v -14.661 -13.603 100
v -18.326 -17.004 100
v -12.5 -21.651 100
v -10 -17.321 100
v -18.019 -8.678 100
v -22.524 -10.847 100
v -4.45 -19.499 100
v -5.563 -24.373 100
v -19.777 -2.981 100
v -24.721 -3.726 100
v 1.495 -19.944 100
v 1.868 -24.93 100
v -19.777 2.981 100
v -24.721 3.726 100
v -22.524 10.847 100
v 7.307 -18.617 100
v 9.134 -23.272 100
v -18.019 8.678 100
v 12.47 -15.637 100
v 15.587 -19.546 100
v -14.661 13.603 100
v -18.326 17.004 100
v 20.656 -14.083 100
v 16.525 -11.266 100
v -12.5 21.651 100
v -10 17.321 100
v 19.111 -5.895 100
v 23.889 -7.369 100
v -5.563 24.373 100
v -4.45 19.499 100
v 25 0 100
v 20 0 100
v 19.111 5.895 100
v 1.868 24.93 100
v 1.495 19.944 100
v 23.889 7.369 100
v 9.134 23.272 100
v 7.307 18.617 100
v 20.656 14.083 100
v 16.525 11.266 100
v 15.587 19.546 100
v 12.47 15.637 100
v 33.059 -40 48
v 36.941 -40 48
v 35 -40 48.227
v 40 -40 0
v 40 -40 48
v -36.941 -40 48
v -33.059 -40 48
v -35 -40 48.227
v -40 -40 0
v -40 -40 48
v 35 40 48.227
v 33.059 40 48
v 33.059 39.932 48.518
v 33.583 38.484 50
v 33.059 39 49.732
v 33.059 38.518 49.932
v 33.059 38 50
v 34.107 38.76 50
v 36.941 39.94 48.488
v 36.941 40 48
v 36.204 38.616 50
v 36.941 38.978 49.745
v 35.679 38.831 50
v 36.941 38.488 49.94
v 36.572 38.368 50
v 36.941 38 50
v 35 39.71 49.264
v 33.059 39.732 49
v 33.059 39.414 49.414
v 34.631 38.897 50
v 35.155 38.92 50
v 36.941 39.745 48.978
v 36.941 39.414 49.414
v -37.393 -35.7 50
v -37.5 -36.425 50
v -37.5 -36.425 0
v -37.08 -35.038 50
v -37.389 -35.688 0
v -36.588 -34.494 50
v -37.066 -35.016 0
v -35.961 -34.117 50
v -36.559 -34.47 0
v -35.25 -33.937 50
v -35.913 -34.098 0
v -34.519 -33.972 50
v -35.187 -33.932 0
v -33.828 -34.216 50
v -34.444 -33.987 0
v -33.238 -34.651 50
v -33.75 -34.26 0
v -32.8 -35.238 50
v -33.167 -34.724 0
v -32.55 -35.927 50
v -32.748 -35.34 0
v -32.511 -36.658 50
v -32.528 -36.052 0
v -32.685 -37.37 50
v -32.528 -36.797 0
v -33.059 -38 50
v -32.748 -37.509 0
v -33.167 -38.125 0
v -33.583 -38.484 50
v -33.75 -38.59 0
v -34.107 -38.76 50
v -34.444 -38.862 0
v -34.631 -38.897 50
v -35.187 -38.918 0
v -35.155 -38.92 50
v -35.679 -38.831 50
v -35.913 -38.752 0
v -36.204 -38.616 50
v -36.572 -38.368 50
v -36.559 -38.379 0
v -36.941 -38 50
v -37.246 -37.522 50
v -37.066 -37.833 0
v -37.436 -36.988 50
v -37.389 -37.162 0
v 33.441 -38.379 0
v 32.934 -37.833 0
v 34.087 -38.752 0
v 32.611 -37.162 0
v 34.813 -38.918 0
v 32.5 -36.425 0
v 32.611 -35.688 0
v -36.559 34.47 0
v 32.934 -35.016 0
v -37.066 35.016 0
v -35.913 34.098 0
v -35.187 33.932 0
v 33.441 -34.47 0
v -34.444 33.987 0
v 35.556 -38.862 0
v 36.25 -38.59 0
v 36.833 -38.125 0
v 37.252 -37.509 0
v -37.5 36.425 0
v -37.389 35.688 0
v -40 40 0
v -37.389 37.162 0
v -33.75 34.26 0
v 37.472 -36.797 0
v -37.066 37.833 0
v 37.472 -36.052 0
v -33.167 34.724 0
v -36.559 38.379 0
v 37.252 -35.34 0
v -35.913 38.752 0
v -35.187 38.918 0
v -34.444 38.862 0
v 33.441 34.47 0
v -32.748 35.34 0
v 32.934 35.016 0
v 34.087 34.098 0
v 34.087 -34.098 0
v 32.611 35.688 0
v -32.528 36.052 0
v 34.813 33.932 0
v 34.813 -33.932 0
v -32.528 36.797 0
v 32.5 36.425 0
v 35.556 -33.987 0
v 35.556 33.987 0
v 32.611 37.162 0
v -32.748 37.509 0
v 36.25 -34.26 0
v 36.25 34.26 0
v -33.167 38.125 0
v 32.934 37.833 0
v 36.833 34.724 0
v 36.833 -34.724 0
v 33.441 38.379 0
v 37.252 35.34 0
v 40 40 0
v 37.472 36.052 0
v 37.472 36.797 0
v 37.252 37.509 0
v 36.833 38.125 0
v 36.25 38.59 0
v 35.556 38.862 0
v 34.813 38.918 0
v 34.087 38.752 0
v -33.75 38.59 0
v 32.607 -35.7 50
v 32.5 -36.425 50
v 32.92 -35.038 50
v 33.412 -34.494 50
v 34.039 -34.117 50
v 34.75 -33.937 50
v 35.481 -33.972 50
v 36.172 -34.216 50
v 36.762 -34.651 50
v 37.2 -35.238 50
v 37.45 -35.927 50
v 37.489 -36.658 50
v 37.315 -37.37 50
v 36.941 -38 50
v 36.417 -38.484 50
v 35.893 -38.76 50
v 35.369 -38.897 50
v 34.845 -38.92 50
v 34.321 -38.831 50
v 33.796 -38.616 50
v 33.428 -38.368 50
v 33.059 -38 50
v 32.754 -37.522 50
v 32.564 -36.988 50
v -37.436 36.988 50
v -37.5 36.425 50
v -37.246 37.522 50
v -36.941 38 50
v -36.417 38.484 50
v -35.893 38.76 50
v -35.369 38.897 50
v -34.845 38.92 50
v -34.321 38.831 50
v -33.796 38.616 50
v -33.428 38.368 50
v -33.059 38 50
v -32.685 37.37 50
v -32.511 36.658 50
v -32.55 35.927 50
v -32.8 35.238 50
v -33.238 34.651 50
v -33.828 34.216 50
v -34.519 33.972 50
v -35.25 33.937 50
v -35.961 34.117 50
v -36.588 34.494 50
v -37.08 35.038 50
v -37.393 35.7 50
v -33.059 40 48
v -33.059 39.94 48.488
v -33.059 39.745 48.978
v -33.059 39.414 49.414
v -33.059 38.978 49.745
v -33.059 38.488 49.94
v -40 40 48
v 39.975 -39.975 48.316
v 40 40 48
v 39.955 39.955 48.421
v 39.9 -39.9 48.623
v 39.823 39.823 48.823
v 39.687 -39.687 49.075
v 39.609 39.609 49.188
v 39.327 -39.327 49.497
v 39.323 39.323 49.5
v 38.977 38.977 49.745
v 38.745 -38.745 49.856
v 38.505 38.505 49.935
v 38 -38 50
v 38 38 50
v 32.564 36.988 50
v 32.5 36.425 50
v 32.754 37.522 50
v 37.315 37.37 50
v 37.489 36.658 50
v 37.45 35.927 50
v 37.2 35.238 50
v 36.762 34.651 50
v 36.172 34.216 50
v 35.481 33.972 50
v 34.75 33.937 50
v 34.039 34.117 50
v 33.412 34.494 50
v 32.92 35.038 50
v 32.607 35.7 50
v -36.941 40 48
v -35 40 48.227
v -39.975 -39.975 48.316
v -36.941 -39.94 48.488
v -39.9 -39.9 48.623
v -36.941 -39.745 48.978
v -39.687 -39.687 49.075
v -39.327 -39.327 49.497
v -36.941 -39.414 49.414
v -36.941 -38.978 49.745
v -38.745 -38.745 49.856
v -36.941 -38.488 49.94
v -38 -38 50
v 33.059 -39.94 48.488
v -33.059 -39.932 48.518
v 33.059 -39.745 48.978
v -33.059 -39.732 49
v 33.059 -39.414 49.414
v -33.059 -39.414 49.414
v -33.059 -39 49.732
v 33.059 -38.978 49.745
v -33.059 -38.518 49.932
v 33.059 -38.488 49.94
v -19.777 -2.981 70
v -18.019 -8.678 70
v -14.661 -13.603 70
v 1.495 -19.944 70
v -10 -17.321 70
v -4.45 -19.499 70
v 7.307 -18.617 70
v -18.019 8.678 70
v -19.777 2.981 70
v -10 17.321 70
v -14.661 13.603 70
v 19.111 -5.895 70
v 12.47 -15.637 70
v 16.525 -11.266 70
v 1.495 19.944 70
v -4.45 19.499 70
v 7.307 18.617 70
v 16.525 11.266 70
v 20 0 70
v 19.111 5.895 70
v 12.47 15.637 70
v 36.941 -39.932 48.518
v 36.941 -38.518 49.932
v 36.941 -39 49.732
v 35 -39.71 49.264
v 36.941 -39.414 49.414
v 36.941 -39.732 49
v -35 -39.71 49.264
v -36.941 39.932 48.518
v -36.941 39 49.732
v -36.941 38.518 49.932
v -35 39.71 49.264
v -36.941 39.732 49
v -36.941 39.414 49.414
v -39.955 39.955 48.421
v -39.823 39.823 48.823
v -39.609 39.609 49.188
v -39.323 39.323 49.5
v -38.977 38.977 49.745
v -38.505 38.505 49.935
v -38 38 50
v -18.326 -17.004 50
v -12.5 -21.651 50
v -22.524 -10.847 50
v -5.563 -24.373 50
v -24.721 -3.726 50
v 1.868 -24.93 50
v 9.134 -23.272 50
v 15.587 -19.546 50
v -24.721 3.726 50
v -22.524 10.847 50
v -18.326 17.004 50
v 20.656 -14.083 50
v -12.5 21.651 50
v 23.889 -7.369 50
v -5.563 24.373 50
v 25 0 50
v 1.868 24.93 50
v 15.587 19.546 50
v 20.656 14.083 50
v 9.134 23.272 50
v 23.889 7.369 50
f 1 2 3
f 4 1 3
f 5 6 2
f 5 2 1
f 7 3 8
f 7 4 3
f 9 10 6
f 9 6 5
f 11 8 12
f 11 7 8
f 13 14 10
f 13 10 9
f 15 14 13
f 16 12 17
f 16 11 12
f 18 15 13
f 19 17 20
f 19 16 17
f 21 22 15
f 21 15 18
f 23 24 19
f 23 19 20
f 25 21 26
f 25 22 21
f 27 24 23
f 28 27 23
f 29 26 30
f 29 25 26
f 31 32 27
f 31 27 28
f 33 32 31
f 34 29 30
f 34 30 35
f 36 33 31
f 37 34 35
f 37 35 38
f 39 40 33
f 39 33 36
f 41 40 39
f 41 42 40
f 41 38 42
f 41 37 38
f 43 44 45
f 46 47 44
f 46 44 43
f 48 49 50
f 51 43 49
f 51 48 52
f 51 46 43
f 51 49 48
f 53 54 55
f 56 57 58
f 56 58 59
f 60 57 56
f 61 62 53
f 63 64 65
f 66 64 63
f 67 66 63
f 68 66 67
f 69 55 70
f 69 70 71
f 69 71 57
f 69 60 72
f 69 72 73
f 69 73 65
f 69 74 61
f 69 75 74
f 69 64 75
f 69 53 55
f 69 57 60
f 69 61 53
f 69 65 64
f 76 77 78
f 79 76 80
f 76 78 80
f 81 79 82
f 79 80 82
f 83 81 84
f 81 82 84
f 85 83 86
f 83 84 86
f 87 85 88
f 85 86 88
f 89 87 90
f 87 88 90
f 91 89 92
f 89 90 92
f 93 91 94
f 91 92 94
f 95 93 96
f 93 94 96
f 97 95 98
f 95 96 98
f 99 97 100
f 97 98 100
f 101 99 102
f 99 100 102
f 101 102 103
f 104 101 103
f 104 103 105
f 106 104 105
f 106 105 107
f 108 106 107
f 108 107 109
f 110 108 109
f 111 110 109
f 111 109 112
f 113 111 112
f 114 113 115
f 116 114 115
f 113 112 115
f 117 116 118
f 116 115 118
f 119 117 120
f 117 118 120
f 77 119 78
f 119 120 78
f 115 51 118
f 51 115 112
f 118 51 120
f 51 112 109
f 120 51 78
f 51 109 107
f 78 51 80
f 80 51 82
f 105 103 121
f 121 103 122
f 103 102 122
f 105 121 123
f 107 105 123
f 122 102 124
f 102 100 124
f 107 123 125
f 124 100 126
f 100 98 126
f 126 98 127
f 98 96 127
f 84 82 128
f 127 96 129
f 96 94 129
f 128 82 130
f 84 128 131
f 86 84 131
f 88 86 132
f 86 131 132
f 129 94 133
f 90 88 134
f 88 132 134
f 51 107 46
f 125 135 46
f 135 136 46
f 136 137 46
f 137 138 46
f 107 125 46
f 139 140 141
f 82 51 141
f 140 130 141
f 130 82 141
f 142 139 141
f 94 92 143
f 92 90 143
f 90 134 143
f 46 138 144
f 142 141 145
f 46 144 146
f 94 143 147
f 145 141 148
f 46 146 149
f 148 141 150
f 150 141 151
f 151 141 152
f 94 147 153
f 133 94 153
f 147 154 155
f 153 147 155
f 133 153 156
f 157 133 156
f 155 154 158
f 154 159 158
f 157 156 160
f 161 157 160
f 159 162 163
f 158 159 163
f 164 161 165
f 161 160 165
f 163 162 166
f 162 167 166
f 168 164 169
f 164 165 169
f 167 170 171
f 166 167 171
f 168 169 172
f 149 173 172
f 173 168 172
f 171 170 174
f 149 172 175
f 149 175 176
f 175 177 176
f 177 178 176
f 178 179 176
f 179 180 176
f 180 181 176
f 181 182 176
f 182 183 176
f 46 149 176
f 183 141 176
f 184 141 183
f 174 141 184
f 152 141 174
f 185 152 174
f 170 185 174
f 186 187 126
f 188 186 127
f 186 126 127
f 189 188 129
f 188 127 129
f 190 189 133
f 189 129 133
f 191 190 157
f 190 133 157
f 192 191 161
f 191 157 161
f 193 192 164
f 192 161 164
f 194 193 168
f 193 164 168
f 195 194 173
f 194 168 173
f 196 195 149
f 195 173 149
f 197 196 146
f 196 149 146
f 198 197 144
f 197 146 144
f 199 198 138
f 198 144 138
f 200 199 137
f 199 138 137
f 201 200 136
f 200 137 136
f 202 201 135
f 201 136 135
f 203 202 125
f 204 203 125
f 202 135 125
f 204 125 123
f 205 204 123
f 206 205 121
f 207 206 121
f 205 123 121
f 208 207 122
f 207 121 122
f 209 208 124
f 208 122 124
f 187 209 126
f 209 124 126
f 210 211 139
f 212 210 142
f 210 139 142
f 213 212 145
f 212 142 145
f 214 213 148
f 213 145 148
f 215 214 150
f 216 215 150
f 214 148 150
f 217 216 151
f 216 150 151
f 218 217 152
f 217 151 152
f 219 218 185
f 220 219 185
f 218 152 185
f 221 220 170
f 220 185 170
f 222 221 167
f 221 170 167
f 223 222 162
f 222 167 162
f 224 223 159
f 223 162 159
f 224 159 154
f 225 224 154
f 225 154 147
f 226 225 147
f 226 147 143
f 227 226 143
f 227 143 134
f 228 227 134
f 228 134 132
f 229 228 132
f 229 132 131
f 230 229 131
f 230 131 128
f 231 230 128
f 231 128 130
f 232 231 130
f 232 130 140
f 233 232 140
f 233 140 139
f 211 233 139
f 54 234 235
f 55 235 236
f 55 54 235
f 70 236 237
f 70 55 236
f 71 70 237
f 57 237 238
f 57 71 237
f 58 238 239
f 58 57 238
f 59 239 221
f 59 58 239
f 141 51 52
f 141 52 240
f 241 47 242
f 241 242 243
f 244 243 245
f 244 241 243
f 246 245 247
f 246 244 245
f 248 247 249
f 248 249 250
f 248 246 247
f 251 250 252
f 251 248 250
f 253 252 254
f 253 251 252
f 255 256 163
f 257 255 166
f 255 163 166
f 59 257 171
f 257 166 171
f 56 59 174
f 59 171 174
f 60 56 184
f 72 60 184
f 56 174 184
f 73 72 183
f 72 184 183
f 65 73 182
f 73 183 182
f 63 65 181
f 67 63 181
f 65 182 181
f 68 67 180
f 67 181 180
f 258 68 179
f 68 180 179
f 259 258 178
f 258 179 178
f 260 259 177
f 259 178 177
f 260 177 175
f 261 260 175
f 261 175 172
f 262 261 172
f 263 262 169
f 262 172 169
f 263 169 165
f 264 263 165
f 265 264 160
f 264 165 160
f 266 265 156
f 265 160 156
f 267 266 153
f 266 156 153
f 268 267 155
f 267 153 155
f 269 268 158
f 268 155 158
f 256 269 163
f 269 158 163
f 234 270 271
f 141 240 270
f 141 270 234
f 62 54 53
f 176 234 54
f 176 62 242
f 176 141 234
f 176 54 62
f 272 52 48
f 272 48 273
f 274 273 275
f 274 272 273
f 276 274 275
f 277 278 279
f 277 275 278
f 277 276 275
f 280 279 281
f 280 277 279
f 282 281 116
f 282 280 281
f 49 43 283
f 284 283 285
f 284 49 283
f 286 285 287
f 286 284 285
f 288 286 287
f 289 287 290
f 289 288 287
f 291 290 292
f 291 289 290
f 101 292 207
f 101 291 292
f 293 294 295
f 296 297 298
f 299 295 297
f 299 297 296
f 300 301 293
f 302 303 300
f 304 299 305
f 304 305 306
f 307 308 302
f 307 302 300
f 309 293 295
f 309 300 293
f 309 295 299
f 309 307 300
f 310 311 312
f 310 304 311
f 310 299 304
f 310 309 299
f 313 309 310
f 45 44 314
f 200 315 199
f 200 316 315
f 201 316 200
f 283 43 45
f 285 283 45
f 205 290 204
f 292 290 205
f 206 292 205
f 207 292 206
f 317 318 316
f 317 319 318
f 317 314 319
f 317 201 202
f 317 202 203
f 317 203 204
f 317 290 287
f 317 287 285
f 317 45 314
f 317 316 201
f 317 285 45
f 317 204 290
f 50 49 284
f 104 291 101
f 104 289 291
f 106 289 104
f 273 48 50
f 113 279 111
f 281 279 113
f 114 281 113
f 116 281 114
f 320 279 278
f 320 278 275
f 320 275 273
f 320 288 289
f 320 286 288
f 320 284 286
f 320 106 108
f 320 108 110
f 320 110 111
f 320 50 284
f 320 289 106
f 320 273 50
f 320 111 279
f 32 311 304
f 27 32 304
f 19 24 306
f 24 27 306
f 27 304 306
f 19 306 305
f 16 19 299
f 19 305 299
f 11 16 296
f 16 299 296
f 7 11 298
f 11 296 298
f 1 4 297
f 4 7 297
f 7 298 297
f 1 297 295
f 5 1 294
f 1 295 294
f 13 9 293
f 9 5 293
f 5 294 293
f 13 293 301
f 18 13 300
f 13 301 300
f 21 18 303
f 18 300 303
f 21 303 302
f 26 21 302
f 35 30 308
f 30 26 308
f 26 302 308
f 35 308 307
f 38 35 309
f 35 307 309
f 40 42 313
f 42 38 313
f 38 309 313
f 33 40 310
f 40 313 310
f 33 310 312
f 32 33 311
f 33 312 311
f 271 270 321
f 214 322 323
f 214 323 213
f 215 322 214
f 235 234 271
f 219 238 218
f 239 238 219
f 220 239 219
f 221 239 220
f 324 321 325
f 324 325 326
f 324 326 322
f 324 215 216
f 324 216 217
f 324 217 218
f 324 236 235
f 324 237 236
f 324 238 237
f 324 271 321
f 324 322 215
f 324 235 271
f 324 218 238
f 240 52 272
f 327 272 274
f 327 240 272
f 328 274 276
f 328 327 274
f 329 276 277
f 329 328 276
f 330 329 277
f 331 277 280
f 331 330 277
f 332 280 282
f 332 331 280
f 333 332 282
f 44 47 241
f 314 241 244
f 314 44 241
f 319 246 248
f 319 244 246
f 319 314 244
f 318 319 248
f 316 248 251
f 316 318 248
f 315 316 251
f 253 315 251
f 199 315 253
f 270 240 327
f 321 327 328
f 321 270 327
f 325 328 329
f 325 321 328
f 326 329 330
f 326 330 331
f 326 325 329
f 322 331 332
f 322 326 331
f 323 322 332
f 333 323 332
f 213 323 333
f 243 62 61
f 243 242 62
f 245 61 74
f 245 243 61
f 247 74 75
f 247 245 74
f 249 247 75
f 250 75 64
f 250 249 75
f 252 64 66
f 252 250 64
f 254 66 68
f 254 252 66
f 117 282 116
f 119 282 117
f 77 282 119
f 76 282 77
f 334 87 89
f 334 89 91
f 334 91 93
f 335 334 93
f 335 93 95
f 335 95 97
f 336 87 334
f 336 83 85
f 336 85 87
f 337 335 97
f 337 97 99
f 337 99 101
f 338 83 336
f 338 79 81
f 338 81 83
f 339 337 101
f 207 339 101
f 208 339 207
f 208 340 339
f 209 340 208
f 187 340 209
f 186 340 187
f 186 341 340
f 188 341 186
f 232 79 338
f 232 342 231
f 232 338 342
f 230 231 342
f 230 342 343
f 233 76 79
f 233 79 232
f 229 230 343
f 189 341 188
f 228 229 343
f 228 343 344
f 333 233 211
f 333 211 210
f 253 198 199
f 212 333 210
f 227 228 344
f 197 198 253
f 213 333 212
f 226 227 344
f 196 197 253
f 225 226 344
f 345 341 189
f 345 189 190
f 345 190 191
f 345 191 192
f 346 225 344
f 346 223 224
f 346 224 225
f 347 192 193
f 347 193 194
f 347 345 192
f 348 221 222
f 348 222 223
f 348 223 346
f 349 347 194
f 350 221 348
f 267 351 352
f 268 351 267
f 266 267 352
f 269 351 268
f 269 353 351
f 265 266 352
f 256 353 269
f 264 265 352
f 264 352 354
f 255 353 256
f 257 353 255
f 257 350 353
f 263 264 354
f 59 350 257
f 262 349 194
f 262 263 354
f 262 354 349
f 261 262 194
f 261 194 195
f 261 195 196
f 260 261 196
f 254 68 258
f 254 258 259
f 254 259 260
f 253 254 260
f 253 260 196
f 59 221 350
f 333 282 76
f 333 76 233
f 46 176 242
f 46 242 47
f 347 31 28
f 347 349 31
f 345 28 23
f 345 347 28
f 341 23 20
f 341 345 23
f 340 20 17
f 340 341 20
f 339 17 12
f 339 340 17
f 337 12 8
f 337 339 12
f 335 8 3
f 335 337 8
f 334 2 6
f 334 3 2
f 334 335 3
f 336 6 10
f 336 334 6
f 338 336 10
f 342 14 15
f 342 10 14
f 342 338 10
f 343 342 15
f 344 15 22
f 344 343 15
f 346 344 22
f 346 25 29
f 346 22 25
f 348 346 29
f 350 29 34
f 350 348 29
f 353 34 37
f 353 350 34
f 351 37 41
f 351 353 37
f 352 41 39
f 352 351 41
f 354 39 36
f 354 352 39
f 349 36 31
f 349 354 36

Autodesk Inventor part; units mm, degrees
ref_plane "YZ Plane" through (0, 0, 0) normal (1, 0, 0) x (0, 1, 0)
ref_plane "XZ Plane" through (0, 0, 0) normal (0, 1, 0) x (-1, 0, 0)
ref_plane "XY Plane" through (0, 0, 0) normal (0, 0, 1) x (1, 0, 0)
sketch "Boceto1" plane through (0, 0, 0) normal (0, 0, 1) x (1, 0, 0)
  line L0 (-40, 40) -> (40, 40)
  line L1 (40, 40) -> (40, -40)
  line L2 (40, -40) -> (-40, -40)
  line L3 (-40, -40) -> (-40, 40)
  line L4 (-40, 40) -> (40, -40) construction
  line L5 (40, 40) -> (-40, -40) construction
  point P0 (0, 0)
  dimension "d0" = 80
  dimension "d1" = 80
extrude "Extrusión1" add sketch "Boceto1" along normal blind 50
sketch "Boceto2" plane through (0, 0, 50) normal (0, 0, 1) x (1, 0, 0)
  circle A0 centre (0, 0) radius 25
  circle A1 centre (0, 0) radius 20
  dimension "d4" = 50
  dimension "d5" = 5
extrude "Extrusión2" add sketch "Boceto2" along normal blind 50
sketch "Boceto3" plane through (0, 0, 0) normal (0, 0, -1) x (-1, 0, 0)
  line L0 (-40, 40) -> (40, 40) projected
  line L1 (40, 40) -> (40, -40) projected
  line L2 (-40, 40) -> (40, 40)
  line L3 (40, 40) -> (40, -40)
  line L4 (40, -40) -> (-40, -40)
  line L5 (-40, -40) -> (-40, 40)
  line L6 (-35, -36.4247) -> (35, 36.4247) construction
  line L7 (35, -36.4247) -> (-35, 36.4247) construction
  line L8 (-35, 36.4247) -> (-37.5, 36.4247)
  line L9 (-40, 36.4247) -> (-40, 40)
  line L10 (-40, 40) -> (-35, 40)
  line L11 (-35, 40) -> (-35, 38.9247)
  arc A0 (-35.0145, 36.4247) -> (-35.0108, 36.4359) centre (-35.2551, 36.5094) ccw
  circle A1 centre (-35, 36.4247) radius 2.5
  circle A2 centre (35, 36.4247) radius 2.5
  circle A3 centre (-35, -36.4247) radius 2.5
  circle A4 centre (35, -36.4247) radius 2.5
  line L12 (35, 36.4247) -> (32.5, 36.4247)
  line L13 (-32.5, 36.4247) -> (-35, 36.4247)
  line L14 (35, -36.4247) -> (35, -33.9247)
  line L15 (35, 33.9247) -> (35, 36.4247)
  line L16 (-35, 36.4247) -> (-35, 33.9247)
  line L17 (-35, -33.9247) -> (-35, -36.4247)
  line L18 (-35, -36.4247) -> (-32.5, -36.4247)
  line L19 (32.5, -36.4247) -> (35, -36.4247)
  point P0 (0, 0)
  point P1 (-38.2122, 38.2122)
  dimension "d9" = 70
sketch "Boceto4" plane through (0, 0, 0) normal (0, 0, -1) x (-1, 0, 0)
  point P0 (0, 0)
extrude "Extrusión3" cut sketch "Boceto3" against normal blind 50 contours A1 L13 L8 | A1 L16 L13 | L8 L16 A1 | A2 L15 L12 | L12 L15 A2 | L18 L17 A3 | A3 L17 L18 | A4 L19 L14 | L14 L19 A4
thread "Rosca1" size "M5x0.8" class "6H" standard "ANSI Metric M Profile" full length
thread "Rosca2" size "M5x0.8" class "6H" standard "ANSI Metric M Profile" full length
thread "Rosca3" size "M5x0.8" class "6H" standard "ANSI Metric M Profile" full length
thread "Rosca4" size "M5x0.8" class "6H" standard "ANSI Metric M Profile" full length
fillet "Empalme1" radius 2 4 edges at (0, -40, 50) (40, 0, 50) (0, 40, 50) (-40, 0, 50)
thread "Rosca5" size "M40x3" class "6H" standard "ANSI Metric M Profile" full length
sketch "Boceto5" plane through (0, 0, 50) normal (0, 0, 1) x (1, 0, 0)
  circle A0 centre (0, 0) radius 20
extrude "Extrusión4" add sketch "Boceto5" along normal blind 20
properties part number "Lab 1"
